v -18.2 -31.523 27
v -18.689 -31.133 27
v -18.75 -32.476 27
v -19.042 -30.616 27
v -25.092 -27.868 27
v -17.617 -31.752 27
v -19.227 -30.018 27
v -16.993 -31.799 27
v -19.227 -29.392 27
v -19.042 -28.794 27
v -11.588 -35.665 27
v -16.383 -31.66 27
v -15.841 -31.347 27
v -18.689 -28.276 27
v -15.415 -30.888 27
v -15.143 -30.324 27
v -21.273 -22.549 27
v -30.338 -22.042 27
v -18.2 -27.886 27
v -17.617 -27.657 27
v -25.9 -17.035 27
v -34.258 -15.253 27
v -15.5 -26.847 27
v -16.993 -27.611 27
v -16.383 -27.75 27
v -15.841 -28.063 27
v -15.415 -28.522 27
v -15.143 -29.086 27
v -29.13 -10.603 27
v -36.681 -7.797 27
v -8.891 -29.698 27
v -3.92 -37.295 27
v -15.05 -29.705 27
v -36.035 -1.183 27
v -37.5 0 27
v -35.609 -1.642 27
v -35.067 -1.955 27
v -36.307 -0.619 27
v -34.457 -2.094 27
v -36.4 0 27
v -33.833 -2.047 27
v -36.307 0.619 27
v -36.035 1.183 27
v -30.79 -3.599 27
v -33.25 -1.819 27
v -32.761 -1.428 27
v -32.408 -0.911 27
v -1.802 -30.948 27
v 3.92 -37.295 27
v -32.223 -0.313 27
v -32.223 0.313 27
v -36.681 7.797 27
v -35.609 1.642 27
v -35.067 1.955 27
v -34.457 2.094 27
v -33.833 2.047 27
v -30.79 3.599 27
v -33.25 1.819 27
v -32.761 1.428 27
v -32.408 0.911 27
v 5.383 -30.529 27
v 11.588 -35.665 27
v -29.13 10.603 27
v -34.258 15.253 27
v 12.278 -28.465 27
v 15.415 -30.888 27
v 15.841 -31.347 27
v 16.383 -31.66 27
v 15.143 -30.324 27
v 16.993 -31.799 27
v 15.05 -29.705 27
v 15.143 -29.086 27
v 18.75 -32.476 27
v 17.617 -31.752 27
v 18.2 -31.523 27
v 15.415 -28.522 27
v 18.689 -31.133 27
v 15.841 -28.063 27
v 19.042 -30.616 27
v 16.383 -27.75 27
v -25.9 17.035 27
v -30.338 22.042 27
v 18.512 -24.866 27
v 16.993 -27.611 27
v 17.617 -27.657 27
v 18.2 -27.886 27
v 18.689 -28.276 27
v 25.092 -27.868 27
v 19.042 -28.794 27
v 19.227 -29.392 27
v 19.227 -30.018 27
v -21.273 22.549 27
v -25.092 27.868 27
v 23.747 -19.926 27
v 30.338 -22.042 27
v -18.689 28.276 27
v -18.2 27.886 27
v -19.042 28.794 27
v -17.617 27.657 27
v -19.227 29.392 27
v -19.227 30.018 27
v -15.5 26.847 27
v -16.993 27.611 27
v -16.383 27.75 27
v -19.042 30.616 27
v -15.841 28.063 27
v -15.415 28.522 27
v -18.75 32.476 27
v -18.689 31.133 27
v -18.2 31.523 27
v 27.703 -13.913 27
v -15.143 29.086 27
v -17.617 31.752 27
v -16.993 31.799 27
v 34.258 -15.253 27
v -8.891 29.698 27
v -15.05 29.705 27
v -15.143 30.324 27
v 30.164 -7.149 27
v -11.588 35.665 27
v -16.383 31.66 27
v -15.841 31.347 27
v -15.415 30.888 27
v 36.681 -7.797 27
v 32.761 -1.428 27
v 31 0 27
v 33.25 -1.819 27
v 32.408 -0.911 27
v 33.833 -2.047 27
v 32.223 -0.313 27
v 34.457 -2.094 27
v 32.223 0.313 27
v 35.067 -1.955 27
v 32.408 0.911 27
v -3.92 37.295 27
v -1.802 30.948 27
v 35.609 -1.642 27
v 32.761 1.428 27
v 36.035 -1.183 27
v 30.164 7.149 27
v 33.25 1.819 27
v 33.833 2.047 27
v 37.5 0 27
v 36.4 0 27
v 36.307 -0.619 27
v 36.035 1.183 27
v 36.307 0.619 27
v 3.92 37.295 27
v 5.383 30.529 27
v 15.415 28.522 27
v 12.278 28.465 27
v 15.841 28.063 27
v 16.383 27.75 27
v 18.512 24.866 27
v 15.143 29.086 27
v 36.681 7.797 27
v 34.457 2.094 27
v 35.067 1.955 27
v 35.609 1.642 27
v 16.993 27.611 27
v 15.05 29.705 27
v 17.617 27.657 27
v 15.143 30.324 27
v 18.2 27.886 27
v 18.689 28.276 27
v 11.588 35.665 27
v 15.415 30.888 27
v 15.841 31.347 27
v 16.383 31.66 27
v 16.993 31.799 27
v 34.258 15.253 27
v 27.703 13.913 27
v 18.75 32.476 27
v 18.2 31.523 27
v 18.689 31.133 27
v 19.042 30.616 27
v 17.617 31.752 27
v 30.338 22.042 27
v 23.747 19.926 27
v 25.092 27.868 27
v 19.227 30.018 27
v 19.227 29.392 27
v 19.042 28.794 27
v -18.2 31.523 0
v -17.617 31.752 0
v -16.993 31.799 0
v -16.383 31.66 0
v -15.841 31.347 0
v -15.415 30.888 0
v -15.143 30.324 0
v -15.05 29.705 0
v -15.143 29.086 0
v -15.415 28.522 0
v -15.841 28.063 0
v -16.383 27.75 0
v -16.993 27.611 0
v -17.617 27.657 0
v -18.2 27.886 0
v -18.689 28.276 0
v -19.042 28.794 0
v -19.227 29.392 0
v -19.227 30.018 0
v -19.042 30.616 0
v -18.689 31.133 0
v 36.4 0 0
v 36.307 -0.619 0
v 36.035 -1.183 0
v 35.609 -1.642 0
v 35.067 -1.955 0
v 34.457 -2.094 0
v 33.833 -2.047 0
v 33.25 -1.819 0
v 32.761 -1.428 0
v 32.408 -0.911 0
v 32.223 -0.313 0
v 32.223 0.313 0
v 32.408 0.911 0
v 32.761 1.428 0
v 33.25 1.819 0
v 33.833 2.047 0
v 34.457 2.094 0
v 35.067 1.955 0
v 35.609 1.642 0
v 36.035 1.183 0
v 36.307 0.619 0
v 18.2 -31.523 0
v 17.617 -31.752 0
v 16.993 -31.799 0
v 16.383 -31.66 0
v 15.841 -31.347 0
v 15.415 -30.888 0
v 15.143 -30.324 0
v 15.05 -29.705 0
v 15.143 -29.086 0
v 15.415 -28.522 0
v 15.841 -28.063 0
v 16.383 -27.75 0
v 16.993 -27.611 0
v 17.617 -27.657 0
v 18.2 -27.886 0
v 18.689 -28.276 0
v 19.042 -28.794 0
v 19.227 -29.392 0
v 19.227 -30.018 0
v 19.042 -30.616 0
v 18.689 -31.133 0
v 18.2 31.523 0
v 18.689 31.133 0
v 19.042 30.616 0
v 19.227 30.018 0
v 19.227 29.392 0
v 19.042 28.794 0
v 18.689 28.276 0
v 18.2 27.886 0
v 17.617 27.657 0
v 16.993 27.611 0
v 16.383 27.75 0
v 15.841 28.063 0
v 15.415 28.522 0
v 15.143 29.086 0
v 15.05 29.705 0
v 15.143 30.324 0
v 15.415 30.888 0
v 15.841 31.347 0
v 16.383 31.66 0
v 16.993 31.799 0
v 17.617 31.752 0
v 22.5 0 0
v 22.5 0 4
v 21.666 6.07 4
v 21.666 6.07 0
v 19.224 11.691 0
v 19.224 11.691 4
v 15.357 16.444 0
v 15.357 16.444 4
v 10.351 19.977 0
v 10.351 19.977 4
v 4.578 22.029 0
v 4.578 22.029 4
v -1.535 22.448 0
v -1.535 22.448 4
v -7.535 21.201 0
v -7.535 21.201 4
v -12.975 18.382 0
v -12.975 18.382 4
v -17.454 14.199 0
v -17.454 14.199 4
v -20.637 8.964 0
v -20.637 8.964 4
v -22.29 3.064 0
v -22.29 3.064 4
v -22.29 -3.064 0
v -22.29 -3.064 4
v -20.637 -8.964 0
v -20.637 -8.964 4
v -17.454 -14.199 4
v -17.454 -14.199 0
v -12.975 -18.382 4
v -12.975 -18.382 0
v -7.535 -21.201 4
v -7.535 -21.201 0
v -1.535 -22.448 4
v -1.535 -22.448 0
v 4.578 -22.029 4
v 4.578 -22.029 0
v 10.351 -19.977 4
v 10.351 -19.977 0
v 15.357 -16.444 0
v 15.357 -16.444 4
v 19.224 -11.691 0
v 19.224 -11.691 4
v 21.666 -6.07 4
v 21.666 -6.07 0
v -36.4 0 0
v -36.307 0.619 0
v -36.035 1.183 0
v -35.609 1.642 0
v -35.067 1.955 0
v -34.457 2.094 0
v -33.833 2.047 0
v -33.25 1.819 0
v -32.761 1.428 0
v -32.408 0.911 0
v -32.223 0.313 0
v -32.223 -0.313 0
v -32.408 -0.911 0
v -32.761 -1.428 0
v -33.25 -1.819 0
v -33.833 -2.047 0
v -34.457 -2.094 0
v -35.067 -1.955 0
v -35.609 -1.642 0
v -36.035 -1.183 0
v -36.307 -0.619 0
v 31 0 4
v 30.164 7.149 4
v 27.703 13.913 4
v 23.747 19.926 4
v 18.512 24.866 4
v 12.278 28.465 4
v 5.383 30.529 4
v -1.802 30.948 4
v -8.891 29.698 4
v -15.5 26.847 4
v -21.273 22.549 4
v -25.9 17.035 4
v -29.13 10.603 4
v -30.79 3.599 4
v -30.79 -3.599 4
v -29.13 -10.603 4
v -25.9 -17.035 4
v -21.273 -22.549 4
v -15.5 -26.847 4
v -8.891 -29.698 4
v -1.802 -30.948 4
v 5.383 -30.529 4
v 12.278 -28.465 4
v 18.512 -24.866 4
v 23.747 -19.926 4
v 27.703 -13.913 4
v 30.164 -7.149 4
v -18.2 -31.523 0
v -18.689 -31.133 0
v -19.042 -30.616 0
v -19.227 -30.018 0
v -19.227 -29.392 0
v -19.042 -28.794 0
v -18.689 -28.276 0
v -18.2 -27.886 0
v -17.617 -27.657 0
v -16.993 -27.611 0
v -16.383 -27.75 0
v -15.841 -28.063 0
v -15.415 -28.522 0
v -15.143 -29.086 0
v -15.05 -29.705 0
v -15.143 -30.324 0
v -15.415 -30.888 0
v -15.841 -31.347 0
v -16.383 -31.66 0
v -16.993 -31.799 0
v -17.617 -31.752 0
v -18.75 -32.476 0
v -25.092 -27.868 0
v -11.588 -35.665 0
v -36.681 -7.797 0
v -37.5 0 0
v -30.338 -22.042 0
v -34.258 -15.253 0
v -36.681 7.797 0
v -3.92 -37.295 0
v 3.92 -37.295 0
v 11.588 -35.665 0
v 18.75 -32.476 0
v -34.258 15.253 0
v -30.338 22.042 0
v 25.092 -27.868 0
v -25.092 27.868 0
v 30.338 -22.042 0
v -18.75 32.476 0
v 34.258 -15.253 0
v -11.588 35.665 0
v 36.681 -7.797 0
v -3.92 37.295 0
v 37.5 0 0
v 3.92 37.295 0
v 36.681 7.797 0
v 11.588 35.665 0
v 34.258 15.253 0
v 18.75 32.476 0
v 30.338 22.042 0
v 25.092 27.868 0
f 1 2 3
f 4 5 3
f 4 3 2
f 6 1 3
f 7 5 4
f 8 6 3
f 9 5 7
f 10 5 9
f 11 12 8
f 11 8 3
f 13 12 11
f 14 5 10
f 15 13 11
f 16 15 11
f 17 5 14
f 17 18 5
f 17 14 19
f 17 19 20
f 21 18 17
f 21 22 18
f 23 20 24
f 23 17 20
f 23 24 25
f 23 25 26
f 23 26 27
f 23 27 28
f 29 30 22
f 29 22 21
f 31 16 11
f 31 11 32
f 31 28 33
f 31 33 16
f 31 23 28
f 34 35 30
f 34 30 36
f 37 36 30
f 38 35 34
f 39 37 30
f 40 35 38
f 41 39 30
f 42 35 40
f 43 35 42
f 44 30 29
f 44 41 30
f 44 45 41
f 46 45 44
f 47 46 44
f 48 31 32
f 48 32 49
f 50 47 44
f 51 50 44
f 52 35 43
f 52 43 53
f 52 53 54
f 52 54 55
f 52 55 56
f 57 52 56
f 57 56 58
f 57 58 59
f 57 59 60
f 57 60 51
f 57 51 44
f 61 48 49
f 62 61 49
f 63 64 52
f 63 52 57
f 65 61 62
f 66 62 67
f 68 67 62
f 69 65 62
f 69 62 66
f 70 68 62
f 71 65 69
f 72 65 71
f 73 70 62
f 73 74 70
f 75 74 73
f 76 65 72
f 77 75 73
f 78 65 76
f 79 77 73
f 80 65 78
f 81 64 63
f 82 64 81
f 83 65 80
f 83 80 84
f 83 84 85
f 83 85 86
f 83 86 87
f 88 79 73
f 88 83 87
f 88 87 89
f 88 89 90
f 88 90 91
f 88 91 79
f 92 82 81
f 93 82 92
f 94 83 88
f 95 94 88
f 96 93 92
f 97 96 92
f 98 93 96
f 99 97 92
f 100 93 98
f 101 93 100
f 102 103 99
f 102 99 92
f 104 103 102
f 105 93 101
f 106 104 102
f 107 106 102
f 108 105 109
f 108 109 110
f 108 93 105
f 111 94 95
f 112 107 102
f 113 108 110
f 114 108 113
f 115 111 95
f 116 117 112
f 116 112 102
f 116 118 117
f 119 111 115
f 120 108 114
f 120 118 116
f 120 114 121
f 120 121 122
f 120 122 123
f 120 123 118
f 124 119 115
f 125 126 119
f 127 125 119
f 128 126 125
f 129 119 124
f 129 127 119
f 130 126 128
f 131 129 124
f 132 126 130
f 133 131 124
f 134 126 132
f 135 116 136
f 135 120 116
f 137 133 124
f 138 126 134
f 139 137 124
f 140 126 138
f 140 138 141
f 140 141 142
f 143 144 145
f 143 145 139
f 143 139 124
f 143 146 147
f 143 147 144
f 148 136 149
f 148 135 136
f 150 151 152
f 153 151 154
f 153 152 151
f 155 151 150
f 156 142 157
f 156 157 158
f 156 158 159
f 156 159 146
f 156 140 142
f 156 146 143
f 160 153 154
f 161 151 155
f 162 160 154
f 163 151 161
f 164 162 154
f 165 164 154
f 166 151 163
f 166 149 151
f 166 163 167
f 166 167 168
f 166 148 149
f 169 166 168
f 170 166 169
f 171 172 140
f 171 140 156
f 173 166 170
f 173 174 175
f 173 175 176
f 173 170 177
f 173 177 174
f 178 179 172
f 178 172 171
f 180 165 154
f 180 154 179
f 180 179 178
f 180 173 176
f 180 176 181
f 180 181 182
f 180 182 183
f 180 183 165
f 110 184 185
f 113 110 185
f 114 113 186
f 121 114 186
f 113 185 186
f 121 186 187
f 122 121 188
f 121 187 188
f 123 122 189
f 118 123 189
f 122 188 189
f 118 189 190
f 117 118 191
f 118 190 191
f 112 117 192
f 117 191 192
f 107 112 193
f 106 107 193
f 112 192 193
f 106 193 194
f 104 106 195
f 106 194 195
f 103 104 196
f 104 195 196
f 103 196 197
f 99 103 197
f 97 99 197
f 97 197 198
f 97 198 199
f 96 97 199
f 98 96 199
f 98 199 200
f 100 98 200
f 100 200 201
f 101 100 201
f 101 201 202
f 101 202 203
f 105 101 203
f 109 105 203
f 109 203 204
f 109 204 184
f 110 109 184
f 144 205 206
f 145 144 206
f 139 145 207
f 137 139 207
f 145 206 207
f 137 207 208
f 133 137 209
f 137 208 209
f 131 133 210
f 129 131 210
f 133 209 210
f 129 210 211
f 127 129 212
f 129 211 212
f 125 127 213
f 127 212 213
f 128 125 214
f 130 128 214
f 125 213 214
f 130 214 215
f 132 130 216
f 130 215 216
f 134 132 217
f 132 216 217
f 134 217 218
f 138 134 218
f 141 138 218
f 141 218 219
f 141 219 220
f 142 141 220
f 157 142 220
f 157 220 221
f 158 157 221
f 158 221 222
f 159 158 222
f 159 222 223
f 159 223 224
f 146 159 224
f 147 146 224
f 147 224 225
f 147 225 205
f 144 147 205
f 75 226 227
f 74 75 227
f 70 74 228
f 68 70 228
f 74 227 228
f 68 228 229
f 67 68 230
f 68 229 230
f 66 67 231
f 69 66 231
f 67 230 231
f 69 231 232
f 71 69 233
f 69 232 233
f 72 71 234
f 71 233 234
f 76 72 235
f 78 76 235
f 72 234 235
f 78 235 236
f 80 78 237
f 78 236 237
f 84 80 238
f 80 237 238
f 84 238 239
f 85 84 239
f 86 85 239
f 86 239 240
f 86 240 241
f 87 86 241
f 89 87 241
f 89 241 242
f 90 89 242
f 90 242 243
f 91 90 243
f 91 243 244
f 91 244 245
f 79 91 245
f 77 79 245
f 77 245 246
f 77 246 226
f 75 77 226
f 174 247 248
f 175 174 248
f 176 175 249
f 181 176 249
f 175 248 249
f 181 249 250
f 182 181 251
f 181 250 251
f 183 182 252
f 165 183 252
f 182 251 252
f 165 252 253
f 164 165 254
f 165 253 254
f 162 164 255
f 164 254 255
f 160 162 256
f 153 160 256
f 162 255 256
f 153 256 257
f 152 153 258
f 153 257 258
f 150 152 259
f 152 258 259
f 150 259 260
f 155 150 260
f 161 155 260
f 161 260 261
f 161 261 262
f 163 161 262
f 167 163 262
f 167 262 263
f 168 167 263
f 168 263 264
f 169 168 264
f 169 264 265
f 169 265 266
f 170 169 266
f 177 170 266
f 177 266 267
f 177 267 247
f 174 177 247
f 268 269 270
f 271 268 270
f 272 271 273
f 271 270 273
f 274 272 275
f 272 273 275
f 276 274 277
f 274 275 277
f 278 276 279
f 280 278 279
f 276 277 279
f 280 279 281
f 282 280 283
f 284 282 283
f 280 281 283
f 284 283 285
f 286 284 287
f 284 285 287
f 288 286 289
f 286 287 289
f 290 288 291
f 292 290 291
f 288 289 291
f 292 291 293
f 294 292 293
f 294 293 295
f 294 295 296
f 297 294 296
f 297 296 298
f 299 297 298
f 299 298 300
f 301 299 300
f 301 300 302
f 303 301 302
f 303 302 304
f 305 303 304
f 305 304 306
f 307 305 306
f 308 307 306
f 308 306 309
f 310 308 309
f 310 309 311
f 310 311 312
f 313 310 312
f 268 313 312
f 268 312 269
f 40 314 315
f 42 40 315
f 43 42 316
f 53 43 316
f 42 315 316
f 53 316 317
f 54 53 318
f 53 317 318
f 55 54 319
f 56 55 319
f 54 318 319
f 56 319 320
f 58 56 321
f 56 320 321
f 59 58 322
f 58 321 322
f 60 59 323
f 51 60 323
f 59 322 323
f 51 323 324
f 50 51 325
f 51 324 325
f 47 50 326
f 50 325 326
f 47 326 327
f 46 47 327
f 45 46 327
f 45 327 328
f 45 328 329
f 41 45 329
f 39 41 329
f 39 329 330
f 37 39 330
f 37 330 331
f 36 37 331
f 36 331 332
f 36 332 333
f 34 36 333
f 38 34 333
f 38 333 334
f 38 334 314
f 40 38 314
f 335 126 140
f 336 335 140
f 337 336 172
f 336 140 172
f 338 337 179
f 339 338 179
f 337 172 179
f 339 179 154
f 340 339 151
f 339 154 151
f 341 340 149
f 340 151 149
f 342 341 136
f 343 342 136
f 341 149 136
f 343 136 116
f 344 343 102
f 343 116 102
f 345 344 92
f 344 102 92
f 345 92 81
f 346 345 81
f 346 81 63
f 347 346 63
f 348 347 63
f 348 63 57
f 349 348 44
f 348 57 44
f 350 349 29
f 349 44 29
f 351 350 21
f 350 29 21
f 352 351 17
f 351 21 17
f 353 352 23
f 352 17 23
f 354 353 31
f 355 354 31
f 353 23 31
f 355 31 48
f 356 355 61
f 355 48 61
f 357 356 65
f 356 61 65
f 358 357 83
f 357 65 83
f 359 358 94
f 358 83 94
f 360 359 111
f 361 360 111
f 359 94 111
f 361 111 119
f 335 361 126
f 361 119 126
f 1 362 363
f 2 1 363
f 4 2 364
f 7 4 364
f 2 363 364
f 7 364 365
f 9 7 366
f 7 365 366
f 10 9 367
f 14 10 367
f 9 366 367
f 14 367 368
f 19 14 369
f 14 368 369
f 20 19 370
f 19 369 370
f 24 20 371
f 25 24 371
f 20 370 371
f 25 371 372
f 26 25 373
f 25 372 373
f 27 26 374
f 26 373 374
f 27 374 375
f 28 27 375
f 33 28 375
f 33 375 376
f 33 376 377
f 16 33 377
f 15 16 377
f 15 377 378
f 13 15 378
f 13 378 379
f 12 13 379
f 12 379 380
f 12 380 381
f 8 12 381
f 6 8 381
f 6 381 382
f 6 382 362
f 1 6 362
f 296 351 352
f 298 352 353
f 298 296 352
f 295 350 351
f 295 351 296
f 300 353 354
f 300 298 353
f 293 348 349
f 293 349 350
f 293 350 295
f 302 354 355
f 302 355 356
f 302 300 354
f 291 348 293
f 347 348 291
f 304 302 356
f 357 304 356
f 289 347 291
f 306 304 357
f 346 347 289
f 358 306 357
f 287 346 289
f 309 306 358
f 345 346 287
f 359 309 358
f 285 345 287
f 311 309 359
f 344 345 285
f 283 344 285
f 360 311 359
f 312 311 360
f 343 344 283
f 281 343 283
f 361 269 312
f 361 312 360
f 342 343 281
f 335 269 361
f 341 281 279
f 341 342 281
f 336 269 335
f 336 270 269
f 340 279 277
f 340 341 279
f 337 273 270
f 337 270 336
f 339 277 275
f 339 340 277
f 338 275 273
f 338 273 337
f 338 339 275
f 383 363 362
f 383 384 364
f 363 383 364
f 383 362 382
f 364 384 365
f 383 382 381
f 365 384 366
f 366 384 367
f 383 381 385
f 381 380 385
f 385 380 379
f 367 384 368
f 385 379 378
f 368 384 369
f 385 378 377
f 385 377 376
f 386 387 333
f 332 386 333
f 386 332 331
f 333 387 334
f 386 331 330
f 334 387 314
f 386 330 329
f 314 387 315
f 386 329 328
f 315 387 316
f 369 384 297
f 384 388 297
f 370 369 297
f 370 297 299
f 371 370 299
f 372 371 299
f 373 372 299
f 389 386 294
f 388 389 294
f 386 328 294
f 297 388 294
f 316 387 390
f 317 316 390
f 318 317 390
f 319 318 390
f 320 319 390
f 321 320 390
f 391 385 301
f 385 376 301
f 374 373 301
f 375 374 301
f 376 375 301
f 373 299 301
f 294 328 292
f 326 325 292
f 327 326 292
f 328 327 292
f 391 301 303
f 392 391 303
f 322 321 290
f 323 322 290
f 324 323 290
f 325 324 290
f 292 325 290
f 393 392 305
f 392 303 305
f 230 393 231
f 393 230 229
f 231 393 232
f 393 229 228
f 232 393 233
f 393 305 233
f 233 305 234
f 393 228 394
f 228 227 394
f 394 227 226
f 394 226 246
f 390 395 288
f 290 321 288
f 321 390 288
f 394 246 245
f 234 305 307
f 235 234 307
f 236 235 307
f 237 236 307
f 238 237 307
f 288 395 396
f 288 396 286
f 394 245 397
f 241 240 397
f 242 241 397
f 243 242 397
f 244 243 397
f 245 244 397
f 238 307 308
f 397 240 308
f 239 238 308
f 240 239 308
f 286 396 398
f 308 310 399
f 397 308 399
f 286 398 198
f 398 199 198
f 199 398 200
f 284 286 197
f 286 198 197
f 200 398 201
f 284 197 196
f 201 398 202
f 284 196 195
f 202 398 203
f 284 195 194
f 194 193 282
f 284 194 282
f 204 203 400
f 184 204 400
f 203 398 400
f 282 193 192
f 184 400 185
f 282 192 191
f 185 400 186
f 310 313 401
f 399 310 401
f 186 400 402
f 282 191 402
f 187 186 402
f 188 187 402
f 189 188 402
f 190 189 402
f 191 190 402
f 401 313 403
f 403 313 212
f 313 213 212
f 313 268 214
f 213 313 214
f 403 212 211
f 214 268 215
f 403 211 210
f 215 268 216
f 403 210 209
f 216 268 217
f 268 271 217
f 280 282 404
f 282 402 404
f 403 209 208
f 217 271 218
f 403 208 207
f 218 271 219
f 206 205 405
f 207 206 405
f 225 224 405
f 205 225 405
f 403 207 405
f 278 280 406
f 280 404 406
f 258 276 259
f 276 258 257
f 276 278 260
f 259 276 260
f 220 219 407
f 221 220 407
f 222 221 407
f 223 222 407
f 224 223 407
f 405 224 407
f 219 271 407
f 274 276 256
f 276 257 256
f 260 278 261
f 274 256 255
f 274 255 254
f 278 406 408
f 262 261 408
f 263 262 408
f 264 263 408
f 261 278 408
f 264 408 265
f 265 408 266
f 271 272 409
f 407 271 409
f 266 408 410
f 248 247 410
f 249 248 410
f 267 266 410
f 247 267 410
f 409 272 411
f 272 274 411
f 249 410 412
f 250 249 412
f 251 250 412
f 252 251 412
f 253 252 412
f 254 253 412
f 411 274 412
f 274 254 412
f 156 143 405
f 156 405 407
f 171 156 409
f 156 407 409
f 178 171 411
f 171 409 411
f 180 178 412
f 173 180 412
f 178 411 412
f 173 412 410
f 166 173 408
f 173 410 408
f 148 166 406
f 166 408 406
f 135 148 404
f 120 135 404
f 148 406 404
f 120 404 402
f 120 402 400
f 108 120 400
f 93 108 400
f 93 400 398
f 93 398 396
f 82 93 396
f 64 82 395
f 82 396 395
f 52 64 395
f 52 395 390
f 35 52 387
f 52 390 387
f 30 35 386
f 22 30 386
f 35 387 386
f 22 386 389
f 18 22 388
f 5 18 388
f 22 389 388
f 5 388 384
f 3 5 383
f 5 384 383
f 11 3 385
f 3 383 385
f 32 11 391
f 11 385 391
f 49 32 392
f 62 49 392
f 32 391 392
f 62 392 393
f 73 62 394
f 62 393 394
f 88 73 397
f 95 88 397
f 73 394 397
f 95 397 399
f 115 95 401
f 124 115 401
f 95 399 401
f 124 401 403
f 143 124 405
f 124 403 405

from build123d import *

# Parameters (mm, degrees)
CROQUIS1_R              = 37.5
SALIENTE_EXTRUIR1_DEPTH = 27
CROQUIS2_R              = 31
CORTAR_EXTRUIR1_DEPTH   = 23
CROQUIS3_R              = 22.5
CORTAR_EXTRUIR2_DEPTH   = 23
TALADRO_ROSCADO_M51_D   = 4.2
MATRIZC1_COUNT          = 6


with BuildPart() as part:
    # Croquis1 → Saliente-Extruir1 (new body)
    with BuildSketch(Plane.XY):
        Circle(CROQUIS1_R)
    extrude(amount=SALIENTE_EXTRUIR1_DEPTH)

    # Croquis2 → Cortar-Extruir1 (cut)
    with BuildSketch(Plane.XY.offset(27)):
        Circle(CROQUIS2_R)
    extrude(amount=-CORTAR_EXTRUIR1_DEPTH, mode=Mode.SUBTRACT)

    # Croquis3 → Cortar-Extruir2 (cut)
    with BuildSketch(Plane.XY.offset(4)):
        Circle(CROQUIS3_R)
    extrude(amount=-CORTAR_EXTRUIR2_DEPTH, mode=Mode.SUBTRACT)

    # Taladro roscado M51 (through all)
    with Locations(Plane.XY.offset(27)):
        with Locations((-34.3, 0)):
            taladro_roscado_m51 = Hole(TALADRO_ROSCADO_M51_D / 2)

    # MatrizC1: Taladro roscado M51 ×6 about axis
    matrizc1_axis = Axis((0, 0, 0), (0, 0, 1))
    for i in range(1, MATRIZC1_COUNT):
        add(taladro_roscado_m51.rotate(matrizc1_axis, i * 360 / MATRIZC1_COUNT), mode=Mode.SUBTRACT)


solid = part.part
